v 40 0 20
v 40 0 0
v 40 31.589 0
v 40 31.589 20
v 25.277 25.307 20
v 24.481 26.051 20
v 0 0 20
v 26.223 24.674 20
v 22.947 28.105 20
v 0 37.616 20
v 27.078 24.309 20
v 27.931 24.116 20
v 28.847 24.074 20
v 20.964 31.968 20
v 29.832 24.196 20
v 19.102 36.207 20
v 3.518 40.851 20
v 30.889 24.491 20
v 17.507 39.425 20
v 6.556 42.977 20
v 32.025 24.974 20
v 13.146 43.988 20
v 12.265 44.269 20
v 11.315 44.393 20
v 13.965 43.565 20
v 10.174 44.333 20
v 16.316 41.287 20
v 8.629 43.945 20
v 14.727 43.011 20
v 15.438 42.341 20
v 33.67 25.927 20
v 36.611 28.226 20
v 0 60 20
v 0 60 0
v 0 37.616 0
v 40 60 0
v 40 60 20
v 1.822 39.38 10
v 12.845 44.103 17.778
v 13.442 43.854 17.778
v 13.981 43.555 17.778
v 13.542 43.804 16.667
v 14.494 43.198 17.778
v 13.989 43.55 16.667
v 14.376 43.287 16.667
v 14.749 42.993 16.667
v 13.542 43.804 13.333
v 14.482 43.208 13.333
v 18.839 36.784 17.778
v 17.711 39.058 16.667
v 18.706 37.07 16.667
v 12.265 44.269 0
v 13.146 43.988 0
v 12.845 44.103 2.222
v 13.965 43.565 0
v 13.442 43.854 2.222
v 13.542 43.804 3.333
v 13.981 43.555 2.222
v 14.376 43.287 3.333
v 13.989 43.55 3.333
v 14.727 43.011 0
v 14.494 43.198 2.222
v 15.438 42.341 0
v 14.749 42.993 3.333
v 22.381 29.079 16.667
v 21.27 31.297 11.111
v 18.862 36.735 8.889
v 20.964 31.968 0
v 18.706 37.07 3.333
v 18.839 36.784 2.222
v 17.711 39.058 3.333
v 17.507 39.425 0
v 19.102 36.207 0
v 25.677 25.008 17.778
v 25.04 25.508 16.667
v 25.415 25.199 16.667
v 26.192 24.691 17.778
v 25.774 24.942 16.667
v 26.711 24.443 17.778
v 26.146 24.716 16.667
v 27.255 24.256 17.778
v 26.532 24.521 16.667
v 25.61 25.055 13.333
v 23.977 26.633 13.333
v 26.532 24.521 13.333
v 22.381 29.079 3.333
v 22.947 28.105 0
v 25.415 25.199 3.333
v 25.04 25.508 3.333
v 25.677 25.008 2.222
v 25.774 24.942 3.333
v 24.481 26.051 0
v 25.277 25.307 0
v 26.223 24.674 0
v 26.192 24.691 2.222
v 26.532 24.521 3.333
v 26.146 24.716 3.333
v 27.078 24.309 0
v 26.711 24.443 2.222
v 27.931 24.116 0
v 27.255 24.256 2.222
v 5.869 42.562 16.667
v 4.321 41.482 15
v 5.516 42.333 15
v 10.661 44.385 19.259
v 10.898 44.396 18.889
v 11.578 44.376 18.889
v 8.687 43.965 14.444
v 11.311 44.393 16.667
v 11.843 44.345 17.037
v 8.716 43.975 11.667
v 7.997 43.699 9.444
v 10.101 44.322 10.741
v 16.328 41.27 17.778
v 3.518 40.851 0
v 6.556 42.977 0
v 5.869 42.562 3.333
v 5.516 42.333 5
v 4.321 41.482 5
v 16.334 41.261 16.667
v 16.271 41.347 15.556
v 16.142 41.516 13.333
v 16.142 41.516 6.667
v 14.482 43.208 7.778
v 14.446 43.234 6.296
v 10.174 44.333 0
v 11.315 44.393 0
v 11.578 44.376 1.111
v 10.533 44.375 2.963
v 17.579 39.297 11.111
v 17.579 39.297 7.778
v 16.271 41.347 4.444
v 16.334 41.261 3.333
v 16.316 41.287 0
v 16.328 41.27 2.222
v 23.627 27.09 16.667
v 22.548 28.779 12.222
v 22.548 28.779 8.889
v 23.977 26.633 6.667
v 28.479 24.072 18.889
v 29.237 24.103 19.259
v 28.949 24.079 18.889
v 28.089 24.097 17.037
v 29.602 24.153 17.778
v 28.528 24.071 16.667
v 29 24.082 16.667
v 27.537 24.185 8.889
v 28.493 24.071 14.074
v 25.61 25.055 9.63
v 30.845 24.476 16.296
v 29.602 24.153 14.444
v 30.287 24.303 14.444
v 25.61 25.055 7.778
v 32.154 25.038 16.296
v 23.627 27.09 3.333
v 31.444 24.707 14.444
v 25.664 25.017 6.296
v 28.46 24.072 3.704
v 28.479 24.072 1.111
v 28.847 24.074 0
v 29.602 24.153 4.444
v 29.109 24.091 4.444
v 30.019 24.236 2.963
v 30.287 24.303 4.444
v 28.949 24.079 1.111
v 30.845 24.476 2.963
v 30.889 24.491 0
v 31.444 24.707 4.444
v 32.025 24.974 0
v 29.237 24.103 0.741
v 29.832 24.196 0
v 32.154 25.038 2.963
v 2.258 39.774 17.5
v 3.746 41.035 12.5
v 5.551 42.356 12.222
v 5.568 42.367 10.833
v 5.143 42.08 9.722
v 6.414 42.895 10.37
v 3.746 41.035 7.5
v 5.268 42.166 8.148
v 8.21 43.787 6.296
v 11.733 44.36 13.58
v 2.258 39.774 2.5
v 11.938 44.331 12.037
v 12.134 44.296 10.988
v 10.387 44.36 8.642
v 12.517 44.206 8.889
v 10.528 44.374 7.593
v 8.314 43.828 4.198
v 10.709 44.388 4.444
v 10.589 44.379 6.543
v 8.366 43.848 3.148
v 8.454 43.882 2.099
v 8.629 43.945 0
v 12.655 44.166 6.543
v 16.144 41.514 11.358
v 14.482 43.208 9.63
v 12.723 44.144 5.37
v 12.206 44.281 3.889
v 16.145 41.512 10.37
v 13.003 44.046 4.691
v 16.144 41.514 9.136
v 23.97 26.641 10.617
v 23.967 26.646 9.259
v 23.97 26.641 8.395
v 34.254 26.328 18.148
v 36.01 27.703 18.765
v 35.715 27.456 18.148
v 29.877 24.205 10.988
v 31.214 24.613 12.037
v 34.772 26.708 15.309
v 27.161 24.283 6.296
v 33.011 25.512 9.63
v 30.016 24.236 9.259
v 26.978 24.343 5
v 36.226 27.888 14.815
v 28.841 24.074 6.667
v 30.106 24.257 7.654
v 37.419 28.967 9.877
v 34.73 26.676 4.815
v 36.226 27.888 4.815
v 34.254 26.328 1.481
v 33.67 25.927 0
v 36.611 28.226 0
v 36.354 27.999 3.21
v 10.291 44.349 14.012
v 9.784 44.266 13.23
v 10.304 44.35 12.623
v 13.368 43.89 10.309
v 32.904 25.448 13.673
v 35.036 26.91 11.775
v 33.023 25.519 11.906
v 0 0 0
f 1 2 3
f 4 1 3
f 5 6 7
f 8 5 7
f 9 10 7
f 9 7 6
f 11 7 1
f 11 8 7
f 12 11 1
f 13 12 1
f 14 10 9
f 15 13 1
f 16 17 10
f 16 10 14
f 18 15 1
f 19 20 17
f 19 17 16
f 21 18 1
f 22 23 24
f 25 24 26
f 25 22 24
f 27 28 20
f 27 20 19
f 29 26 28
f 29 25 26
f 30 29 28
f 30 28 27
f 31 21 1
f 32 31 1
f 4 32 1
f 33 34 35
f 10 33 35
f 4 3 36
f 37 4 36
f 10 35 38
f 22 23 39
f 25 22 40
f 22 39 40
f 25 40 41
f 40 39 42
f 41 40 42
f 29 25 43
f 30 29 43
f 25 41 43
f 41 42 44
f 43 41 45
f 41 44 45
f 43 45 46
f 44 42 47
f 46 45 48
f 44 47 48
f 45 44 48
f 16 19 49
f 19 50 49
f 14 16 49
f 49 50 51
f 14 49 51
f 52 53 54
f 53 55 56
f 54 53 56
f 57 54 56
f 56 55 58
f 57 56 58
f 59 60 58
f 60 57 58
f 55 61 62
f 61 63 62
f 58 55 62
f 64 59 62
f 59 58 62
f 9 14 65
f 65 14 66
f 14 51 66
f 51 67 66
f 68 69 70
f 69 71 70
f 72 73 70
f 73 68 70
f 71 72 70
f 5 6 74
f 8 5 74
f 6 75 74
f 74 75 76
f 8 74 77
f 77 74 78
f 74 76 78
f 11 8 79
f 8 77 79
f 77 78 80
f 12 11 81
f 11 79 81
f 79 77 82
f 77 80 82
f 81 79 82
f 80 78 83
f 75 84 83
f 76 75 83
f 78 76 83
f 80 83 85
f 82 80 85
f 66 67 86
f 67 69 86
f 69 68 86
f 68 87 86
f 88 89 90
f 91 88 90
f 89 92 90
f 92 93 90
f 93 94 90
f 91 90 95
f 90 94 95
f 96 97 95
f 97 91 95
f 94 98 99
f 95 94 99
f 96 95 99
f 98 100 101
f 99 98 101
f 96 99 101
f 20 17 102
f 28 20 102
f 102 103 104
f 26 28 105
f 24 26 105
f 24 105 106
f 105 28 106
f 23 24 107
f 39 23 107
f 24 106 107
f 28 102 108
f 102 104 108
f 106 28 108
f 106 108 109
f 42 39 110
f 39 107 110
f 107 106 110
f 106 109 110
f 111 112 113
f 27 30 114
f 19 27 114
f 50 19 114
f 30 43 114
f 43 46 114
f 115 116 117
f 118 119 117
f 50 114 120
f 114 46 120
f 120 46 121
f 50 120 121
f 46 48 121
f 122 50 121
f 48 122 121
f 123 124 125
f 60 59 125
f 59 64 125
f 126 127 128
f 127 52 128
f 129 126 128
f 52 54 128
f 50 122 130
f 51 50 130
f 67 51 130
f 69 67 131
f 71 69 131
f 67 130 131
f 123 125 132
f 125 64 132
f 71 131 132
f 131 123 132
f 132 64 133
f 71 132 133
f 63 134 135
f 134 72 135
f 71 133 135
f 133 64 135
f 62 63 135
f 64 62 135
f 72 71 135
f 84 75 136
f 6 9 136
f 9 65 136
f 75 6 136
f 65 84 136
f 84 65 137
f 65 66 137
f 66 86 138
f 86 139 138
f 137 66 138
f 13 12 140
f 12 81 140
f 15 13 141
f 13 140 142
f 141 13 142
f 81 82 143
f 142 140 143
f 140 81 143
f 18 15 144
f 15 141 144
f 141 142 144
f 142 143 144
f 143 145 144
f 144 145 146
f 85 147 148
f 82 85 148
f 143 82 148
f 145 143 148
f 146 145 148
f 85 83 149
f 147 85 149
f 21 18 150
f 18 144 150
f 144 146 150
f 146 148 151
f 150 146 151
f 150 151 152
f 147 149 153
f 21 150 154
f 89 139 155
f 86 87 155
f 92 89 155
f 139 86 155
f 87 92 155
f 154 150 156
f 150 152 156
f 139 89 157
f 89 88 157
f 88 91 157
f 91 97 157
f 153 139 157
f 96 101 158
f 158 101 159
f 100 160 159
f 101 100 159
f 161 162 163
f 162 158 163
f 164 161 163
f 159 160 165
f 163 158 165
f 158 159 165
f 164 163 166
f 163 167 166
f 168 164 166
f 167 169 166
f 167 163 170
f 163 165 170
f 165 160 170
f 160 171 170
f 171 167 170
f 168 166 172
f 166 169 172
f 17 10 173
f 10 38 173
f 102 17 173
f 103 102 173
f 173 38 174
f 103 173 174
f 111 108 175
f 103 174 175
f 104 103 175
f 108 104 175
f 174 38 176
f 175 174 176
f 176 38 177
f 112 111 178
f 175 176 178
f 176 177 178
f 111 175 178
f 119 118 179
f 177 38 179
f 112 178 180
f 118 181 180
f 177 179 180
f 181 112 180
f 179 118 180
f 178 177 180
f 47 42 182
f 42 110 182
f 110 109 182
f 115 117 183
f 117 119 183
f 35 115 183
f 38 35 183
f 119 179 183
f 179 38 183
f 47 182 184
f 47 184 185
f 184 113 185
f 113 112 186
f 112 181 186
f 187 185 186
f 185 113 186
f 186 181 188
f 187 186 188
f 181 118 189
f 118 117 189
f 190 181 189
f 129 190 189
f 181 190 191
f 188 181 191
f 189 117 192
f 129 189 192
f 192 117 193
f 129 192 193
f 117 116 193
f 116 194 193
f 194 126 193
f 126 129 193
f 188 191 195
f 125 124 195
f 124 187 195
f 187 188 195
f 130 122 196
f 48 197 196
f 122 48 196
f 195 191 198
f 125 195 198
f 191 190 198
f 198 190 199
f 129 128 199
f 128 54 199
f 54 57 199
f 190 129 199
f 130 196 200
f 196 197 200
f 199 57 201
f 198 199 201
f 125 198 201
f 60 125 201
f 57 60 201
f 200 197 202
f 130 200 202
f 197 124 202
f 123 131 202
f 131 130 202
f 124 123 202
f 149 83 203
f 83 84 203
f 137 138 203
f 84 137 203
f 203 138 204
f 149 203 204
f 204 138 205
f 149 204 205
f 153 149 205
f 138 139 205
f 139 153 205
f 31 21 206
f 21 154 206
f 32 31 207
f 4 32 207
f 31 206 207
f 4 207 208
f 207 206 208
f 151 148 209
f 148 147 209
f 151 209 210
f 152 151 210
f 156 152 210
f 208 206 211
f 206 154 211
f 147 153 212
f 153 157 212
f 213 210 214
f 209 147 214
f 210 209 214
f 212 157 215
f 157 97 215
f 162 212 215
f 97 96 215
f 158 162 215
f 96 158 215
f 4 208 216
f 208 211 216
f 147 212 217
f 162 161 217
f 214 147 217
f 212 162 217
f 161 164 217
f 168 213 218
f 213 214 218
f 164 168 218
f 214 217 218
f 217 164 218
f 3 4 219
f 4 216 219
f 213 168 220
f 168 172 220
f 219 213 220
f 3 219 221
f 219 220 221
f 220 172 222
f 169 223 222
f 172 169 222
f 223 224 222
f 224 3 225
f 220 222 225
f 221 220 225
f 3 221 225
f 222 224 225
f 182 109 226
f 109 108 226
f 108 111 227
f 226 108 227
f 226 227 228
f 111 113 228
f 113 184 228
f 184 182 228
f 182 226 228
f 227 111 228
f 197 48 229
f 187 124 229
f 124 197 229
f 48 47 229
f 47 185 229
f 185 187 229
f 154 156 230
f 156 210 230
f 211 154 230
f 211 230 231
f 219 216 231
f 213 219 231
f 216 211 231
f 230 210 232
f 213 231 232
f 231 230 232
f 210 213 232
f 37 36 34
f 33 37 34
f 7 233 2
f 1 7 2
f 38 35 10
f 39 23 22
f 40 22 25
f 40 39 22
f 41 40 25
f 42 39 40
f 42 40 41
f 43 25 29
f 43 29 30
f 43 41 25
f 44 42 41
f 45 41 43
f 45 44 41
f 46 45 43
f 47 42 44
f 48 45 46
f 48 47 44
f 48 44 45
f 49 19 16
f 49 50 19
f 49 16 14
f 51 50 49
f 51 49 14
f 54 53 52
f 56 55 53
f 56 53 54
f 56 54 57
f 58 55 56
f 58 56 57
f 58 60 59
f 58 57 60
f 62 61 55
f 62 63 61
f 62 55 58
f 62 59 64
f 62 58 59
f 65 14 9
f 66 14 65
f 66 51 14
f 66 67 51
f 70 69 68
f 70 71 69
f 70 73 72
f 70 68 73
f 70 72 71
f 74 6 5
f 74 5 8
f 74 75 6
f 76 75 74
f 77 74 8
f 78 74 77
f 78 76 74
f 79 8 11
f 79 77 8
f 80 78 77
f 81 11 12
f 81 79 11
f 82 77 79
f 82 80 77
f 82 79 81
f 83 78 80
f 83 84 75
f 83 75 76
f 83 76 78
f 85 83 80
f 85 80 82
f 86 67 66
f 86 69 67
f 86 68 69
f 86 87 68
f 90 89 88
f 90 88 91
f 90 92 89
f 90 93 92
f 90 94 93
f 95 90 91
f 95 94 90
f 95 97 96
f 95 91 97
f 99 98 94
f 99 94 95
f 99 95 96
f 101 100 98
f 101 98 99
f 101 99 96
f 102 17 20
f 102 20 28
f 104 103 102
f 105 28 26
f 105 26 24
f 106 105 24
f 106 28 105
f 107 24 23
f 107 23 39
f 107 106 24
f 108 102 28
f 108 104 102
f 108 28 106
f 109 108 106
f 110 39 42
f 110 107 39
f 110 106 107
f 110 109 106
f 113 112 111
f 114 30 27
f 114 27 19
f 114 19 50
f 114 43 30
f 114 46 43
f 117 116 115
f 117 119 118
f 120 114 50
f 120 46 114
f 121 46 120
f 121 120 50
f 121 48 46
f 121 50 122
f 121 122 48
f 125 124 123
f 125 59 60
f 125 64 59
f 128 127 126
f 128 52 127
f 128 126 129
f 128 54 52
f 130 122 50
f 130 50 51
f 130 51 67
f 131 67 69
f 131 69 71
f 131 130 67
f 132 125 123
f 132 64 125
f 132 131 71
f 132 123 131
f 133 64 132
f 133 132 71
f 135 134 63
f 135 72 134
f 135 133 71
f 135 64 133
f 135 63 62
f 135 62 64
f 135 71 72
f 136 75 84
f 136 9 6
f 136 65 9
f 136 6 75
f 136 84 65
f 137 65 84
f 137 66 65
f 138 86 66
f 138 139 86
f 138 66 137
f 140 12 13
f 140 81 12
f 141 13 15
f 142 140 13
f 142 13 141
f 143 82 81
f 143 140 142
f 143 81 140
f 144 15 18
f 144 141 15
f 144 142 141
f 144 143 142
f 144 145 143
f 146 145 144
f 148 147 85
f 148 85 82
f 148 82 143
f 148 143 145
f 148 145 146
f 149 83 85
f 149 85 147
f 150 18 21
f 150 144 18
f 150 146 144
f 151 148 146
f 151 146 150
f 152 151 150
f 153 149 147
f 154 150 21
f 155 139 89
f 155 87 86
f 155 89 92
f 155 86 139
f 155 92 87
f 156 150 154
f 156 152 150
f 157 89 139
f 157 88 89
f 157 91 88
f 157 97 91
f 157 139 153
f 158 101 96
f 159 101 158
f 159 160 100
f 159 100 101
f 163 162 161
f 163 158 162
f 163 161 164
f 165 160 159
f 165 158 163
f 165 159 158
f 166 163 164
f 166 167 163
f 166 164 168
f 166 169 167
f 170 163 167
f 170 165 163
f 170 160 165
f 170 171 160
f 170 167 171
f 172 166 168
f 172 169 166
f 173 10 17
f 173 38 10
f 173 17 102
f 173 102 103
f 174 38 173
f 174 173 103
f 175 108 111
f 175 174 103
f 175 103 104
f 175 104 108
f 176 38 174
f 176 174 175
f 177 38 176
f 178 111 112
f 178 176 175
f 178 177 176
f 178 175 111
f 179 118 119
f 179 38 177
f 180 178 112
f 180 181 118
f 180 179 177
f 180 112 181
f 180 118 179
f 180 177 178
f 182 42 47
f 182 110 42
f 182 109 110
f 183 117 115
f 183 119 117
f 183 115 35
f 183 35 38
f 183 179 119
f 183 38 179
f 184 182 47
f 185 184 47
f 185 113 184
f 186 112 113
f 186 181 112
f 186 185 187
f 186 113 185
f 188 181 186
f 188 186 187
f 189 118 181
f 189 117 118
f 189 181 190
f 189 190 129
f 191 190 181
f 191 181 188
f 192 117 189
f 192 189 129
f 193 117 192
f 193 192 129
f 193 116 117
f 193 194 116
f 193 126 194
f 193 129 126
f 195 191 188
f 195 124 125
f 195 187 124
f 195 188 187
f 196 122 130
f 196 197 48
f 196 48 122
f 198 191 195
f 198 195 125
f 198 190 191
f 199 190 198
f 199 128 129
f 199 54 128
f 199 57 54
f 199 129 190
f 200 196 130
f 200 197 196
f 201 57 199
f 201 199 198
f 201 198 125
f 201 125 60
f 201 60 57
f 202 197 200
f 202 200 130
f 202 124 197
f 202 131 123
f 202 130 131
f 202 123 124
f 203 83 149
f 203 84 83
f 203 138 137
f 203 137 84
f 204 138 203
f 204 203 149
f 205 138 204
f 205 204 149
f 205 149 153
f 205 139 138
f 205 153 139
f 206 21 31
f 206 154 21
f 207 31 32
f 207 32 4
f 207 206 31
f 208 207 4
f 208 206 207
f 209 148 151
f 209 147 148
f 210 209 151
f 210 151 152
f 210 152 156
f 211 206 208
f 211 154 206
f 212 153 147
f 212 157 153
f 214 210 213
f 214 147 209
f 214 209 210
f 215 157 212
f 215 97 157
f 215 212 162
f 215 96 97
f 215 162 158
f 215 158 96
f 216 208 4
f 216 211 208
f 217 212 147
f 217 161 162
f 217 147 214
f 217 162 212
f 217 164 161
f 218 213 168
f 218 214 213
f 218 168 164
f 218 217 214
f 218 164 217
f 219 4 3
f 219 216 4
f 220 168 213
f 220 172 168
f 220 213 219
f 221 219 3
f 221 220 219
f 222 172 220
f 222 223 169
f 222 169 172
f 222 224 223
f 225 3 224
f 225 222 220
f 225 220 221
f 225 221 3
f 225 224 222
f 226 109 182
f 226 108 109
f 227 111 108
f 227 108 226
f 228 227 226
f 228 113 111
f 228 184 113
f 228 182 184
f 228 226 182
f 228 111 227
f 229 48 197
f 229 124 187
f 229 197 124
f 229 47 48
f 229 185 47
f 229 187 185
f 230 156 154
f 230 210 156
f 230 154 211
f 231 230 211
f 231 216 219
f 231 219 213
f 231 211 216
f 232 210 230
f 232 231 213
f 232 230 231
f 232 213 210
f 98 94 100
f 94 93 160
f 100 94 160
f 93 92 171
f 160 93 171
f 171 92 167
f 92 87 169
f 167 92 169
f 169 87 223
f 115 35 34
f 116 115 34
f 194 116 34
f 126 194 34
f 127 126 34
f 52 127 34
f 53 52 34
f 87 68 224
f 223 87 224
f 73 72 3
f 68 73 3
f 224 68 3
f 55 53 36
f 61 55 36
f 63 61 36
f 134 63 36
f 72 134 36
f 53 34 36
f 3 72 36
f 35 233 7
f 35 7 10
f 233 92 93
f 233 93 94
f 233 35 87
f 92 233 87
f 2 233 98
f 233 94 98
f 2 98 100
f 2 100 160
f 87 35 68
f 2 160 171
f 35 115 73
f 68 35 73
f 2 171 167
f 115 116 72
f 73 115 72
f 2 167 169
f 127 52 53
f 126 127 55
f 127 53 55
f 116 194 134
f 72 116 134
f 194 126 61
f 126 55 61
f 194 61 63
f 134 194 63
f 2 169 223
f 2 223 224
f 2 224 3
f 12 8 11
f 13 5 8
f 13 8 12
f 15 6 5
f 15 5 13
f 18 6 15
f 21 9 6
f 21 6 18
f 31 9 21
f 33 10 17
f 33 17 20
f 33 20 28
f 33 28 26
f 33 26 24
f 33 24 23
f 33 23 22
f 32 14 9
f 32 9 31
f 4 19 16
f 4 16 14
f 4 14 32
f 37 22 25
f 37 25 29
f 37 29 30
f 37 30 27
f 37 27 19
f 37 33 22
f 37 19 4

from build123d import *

# Parameters (mm, degrees)
SKETCH2_W           = 40
SKETCH2_H           = 60
BOSS_EXTRUDE1_DEPTH = 20
SPLIT1_DEPTH        = 20
SPLIT1_2_DEPTH      = 20


# Read off the part's stored shape, not the designer's step: Split1
with BuildPart() as part:
    # Sketch2 → Boss-Extrude1 (new body)
    with BuildSketch(Plane.XY):
        with Locations((20, 30)):
            Rectangle(SKETCH2_W, SKETCH2_H)
    extrude(amount=BOSS_EXTRUDE1_DEPTH)

    # Split1 2 outline → Split1 2 (cut)
    with BuildSketch(Plane.XY):
        with BuildLine():
            Line((0, 60), (0, 37.615851309))
            add(Edge.make_bspline(
                [(0, 37.615851309), (25.792545387, 63.78325659), (14.38564364, 3.838292105), (40, 31.589340599)],
                knots=[0, 0, 0, 0, 1, 1, 1, 1], degree=3))
            Line((40, 31.589340599), (40, 60))
            Line((40, 60), (0, 60))
        make_face()
    extrude(amount=SPLIT1_2_DEPTH, mode=Mode.SUBTRACT)


with BuildPart() as body_2:
    # Split1 outline → Split1 (new body)
    with BuildSketch(Plane.XY):
        with BuildLine():
            Line((0, 60), (0, 37.615851309))
            add(Edge.make_bspline(
                [(0, 37.615851309), (25.792545387, 63.78325659), (14.38564364, 3.838292105), (40, 31.589340599)],
                knots=[0, 0, 0, 0, 1, 1, 1, 1], degree=3))
            Line((40, 31.589340599), (40, 60))
            Line((40, 60), (0, 60))
        make_face()
    extrude(amount=SPLIT1_DEPTH)


solid = Compound([part.part, body_2.part])
